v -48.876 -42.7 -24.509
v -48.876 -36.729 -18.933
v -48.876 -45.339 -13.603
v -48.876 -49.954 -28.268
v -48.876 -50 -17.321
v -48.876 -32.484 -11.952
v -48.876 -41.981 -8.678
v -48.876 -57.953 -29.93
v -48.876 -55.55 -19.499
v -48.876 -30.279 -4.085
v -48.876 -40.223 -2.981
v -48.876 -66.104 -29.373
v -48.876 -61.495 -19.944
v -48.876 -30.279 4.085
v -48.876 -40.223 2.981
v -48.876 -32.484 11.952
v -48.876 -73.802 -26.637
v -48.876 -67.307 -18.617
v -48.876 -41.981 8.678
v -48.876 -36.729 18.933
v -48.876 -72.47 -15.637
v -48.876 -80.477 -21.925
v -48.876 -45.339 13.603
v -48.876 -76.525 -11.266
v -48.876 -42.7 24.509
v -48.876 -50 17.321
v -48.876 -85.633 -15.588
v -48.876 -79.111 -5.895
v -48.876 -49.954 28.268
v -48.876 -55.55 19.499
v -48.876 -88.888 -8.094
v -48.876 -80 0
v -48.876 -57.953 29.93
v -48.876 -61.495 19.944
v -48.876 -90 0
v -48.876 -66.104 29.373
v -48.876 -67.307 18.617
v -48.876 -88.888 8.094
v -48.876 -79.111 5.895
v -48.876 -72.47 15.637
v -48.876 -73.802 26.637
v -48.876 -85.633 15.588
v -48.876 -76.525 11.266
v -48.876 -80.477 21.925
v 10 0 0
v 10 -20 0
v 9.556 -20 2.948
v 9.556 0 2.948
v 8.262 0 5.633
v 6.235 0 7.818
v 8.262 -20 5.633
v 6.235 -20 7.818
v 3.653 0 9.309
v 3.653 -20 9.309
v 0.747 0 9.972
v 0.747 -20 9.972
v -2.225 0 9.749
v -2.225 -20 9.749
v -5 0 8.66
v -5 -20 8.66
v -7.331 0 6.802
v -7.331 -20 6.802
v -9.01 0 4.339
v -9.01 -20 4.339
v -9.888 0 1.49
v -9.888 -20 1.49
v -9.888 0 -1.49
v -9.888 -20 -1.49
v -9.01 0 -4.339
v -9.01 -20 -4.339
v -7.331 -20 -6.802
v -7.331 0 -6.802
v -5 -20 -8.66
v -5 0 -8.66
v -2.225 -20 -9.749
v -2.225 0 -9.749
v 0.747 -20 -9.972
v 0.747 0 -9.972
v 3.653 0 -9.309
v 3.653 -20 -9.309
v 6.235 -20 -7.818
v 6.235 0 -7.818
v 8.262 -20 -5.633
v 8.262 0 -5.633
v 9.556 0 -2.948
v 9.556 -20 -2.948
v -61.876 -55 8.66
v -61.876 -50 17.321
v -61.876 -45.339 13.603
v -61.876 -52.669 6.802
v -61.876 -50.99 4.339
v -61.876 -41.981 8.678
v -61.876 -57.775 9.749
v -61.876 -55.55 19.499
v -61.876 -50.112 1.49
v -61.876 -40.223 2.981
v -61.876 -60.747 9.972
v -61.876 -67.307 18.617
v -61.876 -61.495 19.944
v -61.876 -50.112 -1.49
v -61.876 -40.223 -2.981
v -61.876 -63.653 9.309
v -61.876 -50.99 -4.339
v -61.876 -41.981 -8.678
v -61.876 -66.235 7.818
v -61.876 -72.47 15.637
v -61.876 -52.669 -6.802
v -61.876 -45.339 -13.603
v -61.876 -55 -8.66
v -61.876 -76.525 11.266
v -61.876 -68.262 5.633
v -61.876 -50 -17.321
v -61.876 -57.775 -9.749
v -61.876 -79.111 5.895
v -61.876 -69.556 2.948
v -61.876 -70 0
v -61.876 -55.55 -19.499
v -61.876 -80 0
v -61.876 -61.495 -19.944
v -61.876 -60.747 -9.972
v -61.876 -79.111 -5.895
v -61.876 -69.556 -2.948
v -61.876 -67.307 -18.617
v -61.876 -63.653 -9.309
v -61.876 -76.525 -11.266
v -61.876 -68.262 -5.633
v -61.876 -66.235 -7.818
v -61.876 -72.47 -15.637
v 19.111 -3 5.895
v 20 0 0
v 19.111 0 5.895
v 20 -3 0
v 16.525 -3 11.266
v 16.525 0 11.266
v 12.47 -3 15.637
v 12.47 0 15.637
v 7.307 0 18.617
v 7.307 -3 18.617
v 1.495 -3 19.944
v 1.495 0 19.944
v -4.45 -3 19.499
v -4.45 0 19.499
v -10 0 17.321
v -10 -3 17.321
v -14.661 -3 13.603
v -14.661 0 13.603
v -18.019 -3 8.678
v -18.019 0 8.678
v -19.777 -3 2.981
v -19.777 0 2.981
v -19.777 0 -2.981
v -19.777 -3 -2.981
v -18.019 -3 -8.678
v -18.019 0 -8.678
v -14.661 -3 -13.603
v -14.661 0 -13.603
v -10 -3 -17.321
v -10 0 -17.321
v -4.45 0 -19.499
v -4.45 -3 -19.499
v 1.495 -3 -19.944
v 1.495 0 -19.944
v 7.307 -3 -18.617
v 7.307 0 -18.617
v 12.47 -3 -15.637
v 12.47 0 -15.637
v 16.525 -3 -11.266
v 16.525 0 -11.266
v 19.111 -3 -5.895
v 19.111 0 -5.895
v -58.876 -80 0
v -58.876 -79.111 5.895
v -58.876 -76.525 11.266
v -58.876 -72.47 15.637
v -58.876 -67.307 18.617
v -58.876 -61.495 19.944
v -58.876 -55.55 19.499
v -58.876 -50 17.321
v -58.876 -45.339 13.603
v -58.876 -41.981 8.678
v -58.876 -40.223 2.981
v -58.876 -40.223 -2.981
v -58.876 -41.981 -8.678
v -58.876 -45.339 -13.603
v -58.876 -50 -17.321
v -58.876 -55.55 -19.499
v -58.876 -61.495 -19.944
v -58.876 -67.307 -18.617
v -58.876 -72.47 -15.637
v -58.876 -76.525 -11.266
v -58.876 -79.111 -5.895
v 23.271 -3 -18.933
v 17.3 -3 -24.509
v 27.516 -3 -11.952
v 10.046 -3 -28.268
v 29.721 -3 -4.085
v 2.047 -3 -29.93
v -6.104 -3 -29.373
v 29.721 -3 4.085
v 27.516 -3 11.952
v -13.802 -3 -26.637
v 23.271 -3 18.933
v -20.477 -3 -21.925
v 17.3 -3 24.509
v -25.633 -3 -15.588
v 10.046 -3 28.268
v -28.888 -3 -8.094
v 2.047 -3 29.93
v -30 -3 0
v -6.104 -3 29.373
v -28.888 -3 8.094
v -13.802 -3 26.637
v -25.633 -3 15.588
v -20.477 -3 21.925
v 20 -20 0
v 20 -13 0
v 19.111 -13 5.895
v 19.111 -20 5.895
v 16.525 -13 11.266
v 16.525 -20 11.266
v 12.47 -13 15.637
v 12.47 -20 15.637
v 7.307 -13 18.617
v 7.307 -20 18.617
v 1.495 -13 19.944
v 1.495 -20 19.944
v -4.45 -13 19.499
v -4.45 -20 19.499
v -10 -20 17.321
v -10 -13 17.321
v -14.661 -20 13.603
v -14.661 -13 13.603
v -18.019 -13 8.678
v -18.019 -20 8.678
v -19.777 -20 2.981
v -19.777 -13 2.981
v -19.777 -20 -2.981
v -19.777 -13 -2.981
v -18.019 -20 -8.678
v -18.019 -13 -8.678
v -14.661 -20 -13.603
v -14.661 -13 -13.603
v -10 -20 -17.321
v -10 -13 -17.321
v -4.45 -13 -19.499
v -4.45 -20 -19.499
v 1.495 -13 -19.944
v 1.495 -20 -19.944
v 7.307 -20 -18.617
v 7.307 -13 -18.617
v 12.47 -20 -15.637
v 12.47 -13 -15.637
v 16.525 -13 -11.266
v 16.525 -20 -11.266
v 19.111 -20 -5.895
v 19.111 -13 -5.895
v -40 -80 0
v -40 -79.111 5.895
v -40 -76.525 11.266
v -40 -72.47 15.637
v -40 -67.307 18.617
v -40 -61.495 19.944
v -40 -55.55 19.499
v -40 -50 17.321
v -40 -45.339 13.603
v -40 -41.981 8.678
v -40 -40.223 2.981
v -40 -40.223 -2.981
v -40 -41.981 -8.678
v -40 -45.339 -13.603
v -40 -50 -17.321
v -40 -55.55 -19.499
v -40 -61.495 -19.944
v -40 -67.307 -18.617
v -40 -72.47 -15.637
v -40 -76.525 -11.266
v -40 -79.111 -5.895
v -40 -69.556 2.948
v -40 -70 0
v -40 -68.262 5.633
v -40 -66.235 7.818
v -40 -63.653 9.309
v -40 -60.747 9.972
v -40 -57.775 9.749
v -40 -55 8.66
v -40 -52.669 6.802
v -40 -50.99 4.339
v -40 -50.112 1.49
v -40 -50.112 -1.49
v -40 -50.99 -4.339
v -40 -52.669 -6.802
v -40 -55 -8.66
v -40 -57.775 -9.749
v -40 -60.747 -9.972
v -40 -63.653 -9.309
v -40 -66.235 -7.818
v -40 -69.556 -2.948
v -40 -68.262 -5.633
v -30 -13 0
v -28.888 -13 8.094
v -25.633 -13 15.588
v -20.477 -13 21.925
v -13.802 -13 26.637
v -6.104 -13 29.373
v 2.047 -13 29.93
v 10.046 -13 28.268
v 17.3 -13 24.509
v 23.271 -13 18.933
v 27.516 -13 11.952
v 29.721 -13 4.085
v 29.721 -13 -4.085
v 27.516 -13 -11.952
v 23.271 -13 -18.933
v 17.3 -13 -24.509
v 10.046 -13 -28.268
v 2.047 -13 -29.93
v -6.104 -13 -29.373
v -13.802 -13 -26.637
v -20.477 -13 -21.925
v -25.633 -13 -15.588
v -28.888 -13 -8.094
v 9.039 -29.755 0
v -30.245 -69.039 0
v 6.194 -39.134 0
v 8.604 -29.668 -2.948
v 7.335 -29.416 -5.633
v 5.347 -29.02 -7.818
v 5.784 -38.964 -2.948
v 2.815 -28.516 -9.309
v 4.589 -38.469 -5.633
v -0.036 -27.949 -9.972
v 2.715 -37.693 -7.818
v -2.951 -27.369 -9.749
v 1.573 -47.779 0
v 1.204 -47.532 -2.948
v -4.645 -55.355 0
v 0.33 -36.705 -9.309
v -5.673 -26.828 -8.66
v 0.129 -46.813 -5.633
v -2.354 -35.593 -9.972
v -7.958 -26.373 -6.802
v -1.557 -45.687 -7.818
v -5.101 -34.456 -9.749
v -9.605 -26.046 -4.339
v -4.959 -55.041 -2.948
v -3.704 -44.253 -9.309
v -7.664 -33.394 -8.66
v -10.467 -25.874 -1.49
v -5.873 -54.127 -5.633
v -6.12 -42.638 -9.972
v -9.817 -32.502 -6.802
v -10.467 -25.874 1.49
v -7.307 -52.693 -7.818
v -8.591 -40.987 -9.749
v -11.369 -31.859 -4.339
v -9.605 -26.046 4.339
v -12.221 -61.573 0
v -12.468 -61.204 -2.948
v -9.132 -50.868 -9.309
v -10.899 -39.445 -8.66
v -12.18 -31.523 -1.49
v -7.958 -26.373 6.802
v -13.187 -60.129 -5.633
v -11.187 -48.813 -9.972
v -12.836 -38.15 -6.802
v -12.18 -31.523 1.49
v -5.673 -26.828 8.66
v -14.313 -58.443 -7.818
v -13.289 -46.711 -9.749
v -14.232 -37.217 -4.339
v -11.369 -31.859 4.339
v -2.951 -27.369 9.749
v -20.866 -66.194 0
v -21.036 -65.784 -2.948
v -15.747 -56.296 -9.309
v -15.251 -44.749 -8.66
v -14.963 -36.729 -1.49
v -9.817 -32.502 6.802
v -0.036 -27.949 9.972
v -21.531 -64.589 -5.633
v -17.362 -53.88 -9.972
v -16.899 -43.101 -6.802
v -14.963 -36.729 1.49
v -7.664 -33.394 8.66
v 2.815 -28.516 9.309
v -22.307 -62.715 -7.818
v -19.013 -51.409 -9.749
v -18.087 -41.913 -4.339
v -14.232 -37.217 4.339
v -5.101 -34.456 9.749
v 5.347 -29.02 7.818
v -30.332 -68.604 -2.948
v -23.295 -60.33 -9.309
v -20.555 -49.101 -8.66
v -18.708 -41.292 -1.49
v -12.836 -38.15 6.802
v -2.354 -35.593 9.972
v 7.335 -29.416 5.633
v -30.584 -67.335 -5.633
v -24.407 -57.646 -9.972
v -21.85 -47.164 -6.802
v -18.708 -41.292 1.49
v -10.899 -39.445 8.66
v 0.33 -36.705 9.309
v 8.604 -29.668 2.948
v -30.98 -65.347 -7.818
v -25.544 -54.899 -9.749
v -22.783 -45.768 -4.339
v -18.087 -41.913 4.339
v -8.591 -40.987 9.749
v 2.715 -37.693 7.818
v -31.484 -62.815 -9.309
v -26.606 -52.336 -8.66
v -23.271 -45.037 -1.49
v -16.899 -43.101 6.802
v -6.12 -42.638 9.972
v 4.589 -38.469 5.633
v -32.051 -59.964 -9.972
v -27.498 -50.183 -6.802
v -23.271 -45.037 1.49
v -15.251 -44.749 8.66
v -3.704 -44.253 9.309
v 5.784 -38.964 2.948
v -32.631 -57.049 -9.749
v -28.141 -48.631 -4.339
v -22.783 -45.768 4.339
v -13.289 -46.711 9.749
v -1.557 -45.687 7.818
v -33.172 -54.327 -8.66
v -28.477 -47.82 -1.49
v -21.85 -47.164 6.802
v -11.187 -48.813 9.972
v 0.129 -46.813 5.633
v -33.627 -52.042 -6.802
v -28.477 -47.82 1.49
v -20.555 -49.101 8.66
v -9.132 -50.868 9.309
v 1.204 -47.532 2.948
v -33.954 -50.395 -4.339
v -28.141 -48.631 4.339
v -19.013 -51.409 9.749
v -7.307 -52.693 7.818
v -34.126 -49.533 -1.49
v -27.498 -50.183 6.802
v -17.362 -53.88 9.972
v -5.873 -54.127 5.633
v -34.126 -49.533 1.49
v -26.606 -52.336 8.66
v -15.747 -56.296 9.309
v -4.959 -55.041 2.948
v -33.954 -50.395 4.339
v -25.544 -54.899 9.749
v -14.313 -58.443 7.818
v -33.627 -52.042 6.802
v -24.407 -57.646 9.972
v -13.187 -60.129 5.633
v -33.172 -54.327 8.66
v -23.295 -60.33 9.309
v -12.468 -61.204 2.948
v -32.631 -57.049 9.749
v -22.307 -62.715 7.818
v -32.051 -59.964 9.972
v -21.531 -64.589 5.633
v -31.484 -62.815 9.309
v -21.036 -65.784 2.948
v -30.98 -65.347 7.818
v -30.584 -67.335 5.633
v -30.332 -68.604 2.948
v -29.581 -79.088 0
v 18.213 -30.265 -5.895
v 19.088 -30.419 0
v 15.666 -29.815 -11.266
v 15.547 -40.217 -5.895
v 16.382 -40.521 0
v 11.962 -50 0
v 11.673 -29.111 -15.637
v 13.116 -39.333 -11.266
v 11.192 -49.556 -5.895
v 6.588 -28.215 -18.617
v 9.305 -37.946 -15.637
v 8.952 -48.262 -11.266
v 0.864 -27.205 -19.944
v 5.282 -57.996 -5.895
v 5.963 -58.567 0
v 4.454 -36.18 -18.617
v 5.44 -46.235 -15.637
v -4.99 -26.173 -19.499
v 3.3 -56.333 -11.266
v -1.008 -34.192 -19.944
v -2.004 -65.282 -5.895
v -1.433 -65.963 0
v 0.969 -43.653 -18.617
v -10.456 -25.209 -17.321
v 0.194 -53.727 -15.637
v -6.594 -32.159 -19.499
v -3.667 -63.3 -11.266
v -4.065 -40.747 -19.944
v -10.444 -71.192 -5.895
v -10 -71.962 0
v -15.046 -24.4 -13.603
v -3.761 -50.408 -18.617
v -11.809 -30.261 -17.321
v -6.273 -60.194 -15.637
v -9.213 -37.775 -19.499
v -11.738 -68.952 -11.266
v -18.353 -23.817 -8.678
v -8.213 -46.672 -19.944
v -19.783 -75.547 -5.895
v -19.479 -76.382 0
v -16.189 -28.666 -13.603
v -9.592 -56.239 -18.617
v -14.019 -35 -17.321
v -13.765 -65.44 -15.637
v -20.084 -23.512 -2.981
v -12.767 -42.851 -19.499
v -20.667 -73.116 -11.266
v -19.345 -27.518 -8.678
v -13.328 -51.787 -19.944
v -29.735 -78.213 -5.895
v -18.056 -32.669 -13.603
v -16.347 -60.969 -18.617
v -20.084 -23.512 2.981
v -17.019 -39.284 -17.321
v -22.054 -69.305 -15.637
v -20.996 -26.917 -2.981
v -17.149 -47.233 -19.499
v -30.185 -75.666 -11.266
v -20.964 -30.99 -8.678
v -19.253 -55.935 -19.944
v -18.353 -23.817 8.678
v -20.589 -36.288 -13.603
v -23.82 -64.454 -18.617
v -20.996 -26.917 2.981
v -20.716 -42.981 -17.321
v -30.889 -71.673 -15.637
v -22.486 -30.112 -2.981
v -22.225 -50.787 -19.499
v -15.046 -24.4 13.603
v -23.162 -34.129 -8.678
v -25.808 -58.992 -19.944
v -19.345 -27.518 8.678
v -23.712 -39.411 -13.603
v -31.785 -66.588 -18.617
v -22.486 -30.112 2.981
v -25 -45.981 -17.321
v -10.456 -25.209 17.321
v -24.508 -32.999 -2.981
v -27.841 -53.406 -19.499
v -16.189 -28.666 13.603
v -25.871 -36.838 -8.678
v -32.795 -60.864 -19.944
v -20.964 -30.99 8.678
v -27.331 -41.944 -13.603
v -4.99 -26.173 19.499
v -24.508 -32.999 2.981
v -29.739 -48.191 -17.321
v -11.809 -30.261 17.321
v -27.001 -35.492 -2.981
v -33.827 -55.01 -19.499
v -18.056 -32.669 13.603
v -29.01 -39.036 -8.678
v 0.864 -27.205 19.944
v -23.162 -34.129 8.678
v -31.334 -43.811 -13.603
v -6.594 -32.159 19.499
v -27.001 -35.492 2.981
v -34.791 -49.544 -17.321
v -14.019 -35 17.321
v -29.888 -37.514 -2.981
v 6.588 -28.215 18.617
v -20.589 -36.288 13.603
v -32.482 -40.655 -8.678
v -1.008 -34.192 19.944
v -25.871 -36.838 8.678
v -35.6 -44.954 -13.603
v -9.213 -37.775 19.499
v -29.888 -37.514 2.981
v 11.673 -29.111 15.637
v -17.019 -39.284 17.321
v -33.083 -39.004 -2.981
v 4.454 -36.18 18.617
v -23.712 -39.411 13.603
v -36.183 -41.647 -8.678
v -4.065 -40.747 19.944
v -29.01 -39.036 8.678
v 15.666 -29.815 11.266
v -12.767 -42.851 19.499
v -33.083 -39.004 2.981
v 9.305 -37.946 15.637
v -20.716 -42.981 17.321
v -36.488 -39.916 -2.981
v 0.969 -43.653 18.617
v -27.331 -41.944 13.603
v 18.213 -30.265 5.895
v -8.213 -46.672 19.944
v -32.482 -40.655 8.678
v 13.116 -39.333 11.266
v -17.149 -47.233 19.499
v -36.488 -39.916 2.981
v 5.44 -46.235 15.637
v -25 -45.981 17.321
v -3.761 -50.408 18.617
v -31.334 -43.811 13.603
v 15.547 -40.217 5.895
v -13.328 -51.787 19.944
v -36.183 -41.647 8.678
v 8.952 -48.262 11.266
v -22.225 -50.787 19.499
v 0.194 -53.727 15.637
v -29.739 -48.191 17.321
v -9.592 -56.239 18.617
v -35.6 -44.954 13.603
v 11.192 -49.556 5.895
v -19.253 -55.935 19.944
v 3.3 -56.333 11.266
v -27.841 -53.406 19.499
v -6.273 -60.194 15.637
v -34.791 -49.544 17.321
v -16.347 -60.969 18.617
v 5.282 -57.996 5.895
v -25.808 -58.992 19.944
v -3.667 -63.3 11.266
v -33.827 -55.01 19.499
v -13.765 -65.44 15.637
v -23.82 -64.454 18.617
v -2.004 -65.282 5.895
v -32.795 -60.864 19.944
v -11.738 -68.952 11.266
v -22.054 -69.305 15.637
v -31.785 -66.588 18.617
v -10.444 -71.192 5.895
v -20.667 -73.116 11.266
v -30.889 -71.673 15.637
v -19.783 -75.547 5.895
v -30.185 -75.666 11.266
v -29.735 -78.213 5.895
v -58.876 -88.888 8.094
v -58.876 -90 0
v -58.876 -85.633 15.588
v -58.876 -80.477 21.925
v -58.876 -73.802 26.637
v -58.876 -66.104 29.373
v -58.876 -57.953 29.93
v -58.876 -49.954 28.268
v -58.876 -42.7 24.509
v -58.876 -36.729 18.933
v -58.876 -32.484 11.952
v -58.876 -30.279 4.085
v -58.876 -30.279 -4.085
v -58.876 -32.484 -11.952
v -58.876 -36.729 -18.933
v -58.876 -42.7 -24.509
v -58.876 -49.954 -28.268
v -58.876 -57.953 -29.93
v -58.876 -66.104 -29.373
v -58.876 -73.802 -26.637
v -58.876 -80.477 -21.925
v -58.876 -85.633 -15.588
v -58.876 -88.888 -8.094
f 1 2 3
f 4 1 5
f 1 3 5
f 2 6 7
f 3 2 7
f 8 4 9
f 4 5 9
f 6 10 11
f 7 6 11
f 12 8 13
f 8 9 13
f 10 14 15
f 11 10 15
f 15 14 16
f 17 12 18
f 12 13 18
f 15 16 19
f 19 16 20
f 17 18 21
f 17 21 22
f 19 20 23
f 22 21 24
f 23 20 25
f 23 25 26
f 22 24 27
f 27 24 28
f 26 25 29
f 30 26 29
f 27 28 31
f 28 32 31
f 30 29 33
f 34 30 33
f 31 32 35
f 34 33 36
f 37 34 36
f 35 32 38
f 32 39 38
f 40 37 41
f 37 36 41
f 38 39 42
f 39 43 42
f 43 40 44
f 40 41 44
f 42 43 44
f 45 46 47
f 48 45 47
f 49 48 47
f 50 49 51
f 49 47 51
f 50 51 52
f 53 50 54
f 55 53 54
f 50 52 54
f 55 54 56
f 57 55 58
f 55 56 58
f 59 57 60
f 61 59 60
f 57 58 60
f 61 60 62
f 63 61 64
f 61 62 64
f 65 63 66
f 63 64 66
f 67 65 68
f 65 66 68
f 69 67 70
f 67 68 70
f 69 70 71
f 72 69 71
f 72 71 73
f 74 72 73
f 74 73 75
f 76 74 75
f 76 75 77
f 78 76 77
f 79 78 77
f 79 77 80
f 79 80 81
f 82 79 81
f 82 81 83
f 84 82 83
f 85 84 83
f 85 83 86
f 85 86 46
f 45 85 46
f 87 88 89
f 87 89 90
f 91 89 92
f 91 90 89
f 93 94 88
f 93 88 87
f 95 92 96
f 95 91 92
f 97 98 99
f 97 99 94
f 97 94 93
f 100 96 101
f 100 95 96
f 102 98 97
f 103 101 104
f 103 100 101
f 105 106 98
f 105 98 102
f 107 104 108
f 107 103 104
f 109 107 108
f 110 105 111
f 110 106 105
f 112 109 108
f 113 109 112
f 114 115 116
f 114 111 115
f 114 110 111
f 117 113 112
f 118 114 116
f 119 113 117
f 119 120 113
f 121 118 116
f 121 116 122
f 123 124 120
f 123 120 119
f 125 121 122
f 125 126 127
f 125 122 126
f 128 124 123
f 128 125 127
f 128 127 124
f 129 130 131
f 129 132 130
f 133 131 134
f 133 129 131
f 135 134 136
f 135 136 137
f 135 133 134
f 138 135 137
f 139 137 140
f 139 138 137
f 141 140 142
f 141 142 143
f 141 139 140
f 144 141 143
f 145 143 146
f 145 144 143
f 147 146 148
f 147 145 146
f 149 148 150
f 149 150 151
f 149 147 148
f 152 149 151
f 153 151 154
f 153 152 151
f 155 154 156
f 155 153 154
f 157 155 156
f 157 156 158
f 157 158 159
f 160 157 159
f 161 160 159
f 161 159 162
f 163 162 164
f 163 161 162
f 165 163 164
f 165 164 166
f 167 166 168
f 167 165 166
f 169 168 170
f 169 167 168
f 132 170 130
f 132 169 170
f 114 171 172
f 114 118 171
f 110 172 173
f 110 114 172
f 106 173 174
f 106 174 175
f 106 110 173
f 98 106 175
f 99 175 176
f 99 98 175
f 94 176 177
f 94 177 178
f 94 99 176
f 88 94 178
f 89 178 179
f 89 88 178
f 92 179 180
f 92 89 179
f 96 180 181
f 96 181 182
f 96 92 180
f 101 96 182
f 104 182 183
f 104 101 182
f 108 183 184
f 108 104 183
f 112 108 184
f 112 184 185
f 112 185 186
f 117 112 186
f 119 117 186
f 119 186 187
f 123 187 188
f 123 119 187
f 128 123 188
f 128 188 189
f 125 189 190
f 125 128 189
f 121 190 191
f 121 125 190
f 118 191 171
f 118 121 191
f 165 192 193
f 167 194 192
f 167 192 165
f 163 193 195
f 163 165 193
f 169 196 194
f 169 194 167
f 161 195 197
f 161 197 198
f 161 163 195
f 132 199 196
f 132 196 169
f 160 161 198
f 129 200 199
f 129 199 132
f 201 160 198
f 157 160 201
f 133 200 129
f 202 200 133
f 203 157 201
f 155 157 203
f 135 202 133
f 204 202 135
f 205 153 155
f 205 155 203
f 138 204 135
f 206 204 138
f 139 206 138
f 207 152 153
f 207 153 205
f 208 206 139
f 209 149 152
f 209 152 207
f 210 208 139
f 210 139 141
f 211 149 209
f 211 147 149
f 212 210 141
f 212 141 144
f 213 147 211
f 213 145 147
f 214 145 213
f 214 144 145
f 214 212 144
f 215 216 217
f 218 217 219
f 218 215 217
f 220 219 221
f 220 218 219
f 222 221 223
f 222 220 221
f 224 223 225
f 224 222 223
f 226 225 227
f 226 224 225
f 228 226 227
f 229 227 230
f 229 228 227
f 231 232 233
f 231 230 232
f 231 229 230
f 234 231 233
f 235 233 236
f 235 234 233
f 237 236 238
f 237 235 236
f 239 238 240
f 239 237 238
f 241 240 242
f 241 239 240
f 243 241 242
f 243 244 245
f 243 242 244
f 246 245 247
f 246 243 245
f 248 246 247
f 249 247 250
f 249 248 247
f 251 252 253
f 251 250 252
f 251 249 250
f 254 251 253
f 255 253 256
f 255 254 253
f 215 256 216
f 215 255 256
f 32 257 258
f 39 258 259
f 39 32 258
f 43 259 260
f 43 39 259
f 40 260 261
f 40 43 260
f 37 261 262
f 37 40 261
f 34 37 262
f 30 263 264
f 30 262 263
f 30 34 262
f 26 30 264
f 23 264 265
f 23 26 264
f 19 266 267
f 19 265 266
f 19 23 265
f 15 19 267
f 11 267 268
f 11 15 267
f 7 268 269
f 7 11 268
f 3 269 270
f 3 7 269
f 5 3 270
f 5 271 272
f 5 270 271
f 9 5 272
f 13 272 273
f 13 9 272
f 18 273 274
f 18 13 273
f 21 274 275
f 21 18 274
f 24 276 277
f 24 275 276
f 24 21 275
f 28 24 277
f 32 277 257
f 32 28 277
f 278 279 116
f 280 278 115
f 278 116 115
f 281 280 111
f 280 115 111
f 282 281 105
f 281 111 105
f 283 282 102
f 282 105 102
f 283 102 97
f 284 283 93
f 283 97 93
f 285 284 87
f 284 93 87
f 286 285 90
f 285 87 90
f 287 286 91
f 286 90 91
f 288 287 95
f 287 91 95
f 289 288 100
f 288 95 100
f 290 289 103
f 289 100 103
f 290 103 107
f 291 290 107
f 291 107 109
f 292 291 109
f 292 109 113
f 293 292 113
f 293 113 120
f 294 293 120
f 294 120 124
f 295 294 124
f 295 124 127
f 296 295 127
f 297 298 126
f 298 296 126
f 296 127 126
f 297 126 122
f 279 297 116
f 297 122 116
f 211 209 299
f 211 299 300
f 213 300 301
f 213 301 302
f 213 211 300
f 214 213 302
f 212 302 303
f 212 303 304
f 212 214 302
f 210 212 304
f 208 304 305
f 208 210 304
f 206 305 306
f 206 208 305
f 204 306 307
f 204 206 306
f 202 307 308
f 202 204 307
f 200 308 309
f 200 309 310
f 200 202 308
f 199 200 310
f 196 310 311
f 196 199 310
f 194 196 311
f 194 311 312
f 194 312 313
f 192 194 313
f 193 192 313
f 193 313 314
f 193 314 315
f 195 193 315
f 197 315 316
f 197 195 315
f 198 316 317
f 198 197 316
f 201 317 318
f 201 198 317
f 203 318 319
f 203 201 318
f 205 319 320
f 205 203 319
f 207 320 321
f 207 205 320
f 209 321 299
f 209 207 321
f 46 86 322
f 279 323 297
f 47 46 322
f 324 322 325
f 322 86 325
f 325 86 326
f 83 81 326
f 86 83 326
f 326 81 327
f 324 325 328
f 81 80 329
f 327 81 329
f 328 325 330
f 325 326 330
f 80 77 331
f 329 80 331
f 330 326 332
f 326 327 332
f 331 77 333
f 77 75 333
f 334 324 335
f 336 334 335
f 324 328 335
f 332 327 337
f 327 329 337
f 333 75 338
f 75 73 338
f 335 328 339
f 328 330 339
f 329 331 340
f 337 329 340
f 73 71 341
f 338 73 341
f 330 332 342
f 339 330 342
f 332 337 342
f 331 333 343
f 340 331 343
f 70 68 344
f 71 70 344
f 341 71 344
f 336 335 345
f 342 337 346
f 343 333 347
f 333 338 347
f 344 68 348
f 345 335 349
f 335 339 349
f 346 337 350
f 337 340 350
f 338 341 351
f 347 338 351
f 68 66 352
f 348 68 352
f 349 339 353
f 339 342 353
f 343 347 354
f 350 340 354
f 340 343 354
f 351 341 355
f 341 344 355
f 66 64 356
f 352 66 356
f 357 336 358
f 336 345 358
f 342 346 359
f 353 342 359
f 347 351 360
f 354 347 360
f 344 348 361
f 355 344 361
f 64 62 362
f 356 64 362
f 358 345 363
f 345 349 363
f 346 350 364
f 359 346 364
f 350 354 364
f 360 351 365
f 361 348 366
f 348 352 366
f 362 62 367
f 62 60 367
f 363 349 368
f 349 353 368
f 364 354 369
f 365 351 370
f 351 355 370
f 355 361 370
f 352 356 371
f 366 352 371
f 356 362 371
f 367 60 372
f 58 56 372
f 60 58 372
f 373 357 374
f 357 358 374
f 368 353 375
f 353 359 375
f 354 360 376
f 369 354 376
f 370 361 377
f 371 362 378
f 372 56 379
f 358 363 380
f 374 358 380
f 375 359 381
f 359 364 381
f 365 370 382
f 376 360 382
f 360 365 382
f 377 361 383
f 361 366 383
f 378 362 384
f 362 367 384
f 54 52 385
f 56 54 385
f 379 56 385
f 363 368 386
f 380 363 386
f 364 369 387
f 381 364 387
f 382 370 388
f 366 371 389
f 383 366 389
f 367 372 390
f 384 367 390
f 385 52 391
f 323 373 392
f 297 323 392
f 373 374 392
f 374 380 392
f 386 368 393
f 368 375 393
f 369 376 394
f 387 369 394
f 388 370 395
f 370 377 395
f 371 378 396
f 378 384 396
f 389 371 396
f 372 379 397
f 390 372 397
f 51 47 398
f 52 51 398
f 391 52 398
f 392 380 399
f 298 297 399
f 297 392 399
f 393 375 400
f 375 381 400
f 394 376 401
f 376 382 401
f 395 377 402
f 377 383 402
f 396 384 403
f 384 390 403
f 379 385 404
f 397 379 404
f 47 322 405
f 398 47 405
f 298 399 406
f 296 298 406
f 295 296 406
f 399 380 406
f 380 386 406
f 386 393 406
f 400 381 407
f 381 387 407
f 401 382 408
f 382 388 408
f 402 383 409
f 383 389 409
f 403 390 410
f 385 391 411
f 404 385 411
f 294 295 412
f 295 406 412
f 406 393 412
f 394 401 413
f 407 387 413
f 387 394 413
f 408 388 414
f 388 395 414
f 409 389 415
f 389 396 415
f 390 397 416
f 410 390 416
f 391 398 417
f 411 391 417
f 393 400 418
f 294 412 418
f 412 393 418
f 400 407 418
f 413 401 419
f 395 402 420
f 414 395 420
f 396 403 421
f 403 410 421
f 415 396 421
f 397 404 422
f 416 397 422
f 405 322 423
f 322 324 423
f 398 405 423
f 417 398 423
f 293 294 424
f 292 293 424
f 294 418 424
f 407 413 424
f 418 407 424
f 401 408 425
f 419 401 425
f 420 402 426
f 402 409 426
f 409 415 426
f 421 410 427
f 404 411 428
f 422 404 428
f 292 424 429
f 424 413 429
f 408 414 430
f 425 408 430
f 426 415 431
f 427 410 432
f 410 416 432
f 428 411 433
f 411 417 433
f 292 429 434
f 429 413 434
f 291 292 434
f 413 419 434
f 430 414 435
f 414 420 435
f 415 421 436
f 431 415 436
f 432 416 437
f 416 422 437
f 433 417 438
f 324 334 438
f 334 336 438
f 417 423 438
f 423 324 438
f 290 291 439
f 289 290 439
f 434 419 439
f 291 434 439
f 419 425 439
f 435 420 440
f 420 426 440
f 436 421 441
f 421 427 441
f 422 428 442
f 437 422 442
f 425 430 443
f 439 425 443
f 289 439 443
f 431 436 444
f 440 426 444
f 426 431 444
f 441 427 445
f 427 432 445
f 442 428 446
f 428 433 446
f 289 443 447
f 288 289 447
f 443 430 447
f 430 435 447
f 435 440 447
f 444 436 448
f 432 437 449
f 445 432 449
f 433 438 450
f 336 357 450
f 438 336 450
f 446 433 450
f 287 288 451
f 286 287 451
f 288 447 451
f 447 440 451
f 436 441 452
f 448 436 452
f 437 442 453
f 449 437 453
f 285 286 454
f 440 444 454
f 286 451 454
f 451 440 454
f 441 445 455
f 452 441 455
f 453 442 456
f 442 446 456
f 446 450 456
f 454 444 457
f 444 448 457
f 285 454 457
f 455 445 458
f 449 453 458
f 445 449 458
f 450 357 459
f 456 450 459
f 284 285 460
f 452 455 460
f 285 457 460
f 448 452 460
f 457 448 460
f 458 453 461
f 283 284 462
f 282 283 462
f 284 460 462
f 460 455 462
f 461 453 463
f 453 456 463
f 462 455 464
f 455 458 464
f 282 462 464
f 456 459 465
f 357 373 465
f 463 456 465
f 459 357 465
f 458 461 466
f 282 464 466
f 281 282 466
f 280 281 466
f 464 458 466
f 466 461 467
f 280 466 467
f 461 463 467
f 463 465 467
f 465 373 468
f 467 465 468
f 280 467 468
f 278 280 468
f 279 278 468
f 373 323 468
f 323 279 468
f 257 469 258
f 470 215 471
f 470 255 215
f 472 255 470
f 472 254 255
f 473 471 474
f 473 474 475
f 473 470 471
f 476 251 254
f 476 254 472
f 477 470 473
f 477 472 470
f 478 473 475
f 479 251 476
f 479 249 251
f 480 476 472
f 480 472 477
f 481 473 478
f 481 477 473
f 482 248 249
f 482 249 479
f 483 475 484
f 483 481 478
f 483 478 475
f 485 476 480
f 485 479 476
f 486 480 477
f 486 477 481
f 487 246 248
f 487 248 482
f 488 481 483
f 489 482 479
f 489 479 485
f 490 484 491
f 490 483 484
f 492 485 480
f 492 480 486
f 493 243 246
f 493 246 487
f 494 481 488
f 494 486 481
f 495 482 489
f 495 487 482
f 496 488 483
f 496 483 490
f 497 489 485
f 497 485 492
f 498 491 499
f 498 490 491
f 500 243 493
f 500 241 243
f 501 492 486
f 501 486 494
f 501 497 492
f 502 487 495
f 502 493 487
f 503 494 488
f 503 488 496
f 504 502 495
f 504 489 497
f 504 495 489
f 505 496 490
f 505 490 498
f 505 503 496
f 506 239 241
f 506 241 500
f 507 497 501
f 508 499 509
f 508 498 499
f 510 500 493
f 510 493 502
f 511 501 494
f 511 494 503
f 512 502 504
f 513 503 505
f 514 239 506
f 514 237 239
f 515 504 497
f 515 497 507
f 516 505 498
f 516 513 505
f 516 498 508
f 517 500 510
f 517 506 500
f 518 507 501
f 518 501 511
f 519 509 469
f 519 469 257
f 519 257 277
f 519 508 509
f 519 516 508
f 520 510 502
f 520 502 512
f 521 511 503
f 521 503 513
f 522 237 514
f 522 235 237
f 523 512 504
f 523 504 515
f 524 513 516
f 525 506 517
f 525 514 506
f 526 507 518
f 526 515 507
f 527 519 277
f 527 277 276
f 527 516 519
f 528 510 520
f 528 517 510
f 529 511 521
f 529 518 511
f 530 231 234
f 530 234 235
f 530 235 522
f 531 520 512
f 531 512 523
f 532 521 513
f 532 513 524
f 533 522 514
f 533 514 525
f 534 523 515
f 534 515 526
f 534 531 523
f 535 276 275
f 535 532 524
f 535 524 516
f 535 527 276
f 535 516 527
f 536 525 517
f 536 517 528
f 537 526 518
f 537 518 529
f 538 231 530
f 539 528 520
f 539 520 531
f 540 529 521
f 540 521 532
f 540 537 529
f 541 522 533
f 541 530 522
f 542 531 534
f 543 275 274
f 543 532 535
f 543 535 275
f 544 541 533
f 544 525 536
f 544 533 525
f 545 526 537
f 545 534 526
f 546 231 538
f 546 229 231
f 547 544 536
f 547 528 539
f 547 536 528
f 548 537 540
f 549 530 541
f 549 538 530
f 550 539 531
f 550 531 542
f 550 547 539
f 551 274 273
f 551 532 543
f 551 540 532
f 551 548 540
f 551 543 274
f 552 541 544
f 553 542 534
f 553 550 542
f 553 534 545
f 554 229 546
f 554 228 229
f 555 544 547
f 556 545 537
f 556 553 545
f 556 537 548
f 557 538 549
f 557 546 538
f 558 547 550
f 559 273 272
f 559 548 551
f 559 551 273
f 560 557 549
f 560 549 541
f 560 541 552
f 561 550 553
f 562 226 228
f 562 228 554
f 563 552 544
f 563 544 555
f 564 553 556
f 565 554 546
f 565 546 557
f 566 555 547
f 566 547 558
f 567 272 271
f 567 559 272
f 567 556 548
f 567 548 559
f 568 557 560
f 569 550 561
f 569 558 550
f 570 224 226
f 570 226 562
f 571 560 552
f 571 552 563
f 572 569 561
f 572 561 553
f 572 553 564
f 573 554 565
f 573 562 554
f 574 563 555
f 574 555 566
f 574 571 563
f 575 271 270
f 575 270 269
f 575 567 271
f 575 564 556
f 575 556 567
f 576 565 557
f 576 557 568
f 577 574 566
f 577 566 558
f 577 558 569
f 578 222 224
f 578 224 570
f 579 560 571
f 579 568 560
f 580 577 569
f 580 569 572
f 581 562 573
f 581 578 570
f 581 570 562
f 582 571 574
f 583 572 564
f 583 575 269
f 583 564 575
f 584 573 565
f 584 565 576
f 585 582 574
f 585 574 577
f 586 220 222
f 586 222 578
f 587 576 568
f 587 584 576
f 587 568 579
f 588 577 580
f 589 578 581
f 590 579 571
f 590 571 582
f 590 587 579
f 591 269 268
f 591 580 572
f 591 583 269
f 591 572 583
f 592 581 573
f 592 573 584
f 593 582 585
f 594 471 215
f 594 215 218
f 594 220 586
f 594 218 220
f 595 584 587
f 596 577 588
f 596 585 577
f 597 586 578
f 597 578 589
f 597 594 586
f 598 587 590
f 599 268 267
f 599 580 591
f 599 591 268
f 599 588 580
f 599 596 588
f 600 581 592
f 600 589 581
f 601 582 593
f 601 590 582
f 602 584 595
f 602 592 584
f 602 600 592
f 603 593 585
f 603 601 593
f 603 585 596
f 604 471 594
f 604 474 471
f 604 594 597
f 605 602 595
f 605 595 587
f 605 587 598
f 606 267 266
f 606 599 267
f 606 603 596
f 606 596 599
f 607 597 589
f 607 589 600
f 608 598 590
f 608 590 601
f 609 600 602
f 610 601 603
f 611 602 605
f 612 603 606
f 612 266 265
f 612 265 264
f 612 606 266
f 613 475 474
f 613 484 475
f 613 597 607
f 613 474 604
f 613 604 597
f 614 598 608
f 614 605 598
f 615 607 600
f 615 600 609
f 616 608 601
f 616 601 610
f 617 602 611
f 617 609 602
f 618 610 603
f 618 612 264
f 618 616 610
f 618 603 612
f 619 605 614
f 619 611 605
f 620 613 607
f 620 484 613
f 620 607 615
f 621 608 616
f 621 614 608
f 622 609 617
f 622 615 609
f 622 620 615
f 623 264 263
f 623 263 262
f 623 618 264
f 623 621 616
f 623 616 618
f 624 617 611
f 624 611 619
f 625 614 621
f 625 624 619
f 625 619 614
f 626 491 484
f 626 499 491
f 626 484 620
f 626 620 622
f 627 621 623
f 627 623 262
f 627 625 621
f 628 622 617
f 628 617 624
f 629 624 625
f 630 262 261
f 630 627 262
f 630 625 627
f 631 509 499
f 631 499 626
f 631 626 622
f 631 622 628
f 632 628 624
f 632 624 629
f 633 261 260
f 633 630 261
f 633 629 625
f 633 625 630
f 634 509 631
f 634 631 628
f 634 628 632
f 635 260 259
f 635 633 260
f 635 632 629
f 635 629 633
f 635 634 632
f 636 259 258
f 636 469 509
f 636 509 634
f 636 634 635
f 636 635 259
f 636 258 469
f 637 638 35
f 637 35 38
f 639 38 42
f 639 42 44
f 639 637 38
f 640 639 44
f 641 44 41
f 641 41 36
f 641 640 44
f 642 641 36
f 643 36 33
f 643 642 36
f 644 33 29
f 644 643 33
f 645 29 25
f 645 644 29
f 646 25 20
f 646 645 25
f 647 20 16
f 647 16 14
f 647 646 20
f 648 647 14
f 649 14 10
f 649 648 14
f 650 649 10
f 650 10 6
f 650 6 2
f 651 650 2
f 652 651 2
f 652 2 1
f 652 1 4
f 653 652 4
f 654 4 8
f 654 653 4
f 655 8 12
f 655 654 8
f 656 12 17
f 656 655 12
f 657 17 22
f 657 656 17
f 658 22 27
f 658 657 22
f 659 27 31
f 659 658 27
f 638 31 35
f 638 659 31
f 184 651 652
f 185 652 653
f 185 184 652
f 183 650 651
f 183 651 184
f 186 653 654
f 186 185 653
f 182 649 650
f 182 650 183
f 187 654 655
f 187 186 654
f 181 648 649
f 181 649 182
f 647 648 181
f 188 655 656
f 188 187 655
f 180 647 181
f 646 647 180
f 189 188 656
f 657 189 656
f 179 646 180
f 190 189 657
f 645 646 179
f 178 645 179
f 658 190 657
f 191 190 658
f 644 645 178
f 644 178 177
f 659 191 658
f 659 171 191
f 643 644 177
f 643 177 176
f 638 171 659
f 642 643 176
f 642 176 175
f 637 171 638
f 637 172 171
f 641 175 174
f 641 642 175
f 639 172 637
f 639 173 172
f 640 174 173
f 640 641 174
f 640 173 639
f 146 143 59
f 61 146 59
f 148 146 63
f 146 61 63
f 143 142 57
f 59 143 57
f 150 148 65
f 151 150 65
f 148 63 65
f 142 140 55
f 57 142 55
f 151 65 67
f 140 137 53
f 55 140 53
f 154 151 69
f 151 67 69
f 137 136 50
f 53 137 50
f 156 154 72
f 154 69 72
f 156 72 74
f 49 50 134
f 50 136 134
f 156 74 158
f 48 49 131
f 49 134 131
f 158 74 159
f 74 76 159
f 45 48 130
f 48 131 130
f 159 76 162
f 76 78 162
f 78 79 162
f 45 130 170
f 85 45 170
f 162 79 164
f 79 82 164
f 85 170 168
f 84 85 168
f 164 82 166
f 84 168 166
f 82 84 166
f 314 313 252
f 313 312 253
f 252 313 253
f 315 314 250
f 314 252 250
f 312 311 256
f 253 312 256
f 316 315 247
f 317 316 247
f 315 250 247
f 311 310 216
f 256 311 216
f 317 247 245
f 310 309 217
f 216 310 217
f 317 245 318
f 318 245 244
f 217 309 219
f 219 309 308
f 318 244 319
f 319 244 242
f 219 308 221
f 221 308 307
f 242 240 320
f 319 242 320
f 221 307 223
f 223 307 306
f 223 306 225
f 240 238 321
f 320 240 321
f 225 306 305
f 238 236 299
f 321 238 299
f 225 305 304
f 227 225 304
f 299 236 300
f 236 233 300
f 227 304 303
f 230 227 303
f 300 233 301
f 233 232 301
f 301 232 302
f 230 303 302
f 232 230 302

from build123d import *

# Parameters (mm, degrees)
F0_R     = 20
F0_R_2   = 10
F4_R     = 30
F4_R_2   = 20
F5_DEPTH = 10
F7_R     = 30
F7_R_2   = 20
F8_DEPTH = 10


with BuildPart() as f2:
    # F2: sweep along a path in F1
    with BuildLine(Plane.XY) as f2_path:
        Line((0, 0), (0, -20))
        ThreePointArc((0, -20), (-11.7157287525, -48.2842712475), (-40, -60))
        Line((-40, -60), (-61.8760055131, -60))
    # F0 (on Front) → F2 (sweep)
    with BuildSketch(Plane.XZ):
        Circle(F0_R)
        Circle(F0_R_2, mode=Mode.SUBTRACT)
    sweep(path=f2_path.line)

    # F4 (on offset) → F5 (join)
    with BuildSketch(Plane(origin=(-58.8760055131, 0, 0), x_dir=(0, -1, 0), z_dir=(-1, 0, 0))):
        with Locations((60, 0)):
            Circle(F4_R)
        with Locations((60, 0)):
            Circle(F4_R_2, mode=Mode.SUBTRACT)
    extrude(amount=-F5_DEPTH)

    # F7 (on offset) → F8 (join)
    with BuildSketch(Plane(origin=(0, -3, 0), x_dir=(-1, 0, 0), z_dir=(0, 1, 0))):
        Circle(F7_R)
        Circle(F7_R_2, mode=Mode.SUBTRACT)
    extrude(amount=-F8_DEPTH)


solid = f2.part
